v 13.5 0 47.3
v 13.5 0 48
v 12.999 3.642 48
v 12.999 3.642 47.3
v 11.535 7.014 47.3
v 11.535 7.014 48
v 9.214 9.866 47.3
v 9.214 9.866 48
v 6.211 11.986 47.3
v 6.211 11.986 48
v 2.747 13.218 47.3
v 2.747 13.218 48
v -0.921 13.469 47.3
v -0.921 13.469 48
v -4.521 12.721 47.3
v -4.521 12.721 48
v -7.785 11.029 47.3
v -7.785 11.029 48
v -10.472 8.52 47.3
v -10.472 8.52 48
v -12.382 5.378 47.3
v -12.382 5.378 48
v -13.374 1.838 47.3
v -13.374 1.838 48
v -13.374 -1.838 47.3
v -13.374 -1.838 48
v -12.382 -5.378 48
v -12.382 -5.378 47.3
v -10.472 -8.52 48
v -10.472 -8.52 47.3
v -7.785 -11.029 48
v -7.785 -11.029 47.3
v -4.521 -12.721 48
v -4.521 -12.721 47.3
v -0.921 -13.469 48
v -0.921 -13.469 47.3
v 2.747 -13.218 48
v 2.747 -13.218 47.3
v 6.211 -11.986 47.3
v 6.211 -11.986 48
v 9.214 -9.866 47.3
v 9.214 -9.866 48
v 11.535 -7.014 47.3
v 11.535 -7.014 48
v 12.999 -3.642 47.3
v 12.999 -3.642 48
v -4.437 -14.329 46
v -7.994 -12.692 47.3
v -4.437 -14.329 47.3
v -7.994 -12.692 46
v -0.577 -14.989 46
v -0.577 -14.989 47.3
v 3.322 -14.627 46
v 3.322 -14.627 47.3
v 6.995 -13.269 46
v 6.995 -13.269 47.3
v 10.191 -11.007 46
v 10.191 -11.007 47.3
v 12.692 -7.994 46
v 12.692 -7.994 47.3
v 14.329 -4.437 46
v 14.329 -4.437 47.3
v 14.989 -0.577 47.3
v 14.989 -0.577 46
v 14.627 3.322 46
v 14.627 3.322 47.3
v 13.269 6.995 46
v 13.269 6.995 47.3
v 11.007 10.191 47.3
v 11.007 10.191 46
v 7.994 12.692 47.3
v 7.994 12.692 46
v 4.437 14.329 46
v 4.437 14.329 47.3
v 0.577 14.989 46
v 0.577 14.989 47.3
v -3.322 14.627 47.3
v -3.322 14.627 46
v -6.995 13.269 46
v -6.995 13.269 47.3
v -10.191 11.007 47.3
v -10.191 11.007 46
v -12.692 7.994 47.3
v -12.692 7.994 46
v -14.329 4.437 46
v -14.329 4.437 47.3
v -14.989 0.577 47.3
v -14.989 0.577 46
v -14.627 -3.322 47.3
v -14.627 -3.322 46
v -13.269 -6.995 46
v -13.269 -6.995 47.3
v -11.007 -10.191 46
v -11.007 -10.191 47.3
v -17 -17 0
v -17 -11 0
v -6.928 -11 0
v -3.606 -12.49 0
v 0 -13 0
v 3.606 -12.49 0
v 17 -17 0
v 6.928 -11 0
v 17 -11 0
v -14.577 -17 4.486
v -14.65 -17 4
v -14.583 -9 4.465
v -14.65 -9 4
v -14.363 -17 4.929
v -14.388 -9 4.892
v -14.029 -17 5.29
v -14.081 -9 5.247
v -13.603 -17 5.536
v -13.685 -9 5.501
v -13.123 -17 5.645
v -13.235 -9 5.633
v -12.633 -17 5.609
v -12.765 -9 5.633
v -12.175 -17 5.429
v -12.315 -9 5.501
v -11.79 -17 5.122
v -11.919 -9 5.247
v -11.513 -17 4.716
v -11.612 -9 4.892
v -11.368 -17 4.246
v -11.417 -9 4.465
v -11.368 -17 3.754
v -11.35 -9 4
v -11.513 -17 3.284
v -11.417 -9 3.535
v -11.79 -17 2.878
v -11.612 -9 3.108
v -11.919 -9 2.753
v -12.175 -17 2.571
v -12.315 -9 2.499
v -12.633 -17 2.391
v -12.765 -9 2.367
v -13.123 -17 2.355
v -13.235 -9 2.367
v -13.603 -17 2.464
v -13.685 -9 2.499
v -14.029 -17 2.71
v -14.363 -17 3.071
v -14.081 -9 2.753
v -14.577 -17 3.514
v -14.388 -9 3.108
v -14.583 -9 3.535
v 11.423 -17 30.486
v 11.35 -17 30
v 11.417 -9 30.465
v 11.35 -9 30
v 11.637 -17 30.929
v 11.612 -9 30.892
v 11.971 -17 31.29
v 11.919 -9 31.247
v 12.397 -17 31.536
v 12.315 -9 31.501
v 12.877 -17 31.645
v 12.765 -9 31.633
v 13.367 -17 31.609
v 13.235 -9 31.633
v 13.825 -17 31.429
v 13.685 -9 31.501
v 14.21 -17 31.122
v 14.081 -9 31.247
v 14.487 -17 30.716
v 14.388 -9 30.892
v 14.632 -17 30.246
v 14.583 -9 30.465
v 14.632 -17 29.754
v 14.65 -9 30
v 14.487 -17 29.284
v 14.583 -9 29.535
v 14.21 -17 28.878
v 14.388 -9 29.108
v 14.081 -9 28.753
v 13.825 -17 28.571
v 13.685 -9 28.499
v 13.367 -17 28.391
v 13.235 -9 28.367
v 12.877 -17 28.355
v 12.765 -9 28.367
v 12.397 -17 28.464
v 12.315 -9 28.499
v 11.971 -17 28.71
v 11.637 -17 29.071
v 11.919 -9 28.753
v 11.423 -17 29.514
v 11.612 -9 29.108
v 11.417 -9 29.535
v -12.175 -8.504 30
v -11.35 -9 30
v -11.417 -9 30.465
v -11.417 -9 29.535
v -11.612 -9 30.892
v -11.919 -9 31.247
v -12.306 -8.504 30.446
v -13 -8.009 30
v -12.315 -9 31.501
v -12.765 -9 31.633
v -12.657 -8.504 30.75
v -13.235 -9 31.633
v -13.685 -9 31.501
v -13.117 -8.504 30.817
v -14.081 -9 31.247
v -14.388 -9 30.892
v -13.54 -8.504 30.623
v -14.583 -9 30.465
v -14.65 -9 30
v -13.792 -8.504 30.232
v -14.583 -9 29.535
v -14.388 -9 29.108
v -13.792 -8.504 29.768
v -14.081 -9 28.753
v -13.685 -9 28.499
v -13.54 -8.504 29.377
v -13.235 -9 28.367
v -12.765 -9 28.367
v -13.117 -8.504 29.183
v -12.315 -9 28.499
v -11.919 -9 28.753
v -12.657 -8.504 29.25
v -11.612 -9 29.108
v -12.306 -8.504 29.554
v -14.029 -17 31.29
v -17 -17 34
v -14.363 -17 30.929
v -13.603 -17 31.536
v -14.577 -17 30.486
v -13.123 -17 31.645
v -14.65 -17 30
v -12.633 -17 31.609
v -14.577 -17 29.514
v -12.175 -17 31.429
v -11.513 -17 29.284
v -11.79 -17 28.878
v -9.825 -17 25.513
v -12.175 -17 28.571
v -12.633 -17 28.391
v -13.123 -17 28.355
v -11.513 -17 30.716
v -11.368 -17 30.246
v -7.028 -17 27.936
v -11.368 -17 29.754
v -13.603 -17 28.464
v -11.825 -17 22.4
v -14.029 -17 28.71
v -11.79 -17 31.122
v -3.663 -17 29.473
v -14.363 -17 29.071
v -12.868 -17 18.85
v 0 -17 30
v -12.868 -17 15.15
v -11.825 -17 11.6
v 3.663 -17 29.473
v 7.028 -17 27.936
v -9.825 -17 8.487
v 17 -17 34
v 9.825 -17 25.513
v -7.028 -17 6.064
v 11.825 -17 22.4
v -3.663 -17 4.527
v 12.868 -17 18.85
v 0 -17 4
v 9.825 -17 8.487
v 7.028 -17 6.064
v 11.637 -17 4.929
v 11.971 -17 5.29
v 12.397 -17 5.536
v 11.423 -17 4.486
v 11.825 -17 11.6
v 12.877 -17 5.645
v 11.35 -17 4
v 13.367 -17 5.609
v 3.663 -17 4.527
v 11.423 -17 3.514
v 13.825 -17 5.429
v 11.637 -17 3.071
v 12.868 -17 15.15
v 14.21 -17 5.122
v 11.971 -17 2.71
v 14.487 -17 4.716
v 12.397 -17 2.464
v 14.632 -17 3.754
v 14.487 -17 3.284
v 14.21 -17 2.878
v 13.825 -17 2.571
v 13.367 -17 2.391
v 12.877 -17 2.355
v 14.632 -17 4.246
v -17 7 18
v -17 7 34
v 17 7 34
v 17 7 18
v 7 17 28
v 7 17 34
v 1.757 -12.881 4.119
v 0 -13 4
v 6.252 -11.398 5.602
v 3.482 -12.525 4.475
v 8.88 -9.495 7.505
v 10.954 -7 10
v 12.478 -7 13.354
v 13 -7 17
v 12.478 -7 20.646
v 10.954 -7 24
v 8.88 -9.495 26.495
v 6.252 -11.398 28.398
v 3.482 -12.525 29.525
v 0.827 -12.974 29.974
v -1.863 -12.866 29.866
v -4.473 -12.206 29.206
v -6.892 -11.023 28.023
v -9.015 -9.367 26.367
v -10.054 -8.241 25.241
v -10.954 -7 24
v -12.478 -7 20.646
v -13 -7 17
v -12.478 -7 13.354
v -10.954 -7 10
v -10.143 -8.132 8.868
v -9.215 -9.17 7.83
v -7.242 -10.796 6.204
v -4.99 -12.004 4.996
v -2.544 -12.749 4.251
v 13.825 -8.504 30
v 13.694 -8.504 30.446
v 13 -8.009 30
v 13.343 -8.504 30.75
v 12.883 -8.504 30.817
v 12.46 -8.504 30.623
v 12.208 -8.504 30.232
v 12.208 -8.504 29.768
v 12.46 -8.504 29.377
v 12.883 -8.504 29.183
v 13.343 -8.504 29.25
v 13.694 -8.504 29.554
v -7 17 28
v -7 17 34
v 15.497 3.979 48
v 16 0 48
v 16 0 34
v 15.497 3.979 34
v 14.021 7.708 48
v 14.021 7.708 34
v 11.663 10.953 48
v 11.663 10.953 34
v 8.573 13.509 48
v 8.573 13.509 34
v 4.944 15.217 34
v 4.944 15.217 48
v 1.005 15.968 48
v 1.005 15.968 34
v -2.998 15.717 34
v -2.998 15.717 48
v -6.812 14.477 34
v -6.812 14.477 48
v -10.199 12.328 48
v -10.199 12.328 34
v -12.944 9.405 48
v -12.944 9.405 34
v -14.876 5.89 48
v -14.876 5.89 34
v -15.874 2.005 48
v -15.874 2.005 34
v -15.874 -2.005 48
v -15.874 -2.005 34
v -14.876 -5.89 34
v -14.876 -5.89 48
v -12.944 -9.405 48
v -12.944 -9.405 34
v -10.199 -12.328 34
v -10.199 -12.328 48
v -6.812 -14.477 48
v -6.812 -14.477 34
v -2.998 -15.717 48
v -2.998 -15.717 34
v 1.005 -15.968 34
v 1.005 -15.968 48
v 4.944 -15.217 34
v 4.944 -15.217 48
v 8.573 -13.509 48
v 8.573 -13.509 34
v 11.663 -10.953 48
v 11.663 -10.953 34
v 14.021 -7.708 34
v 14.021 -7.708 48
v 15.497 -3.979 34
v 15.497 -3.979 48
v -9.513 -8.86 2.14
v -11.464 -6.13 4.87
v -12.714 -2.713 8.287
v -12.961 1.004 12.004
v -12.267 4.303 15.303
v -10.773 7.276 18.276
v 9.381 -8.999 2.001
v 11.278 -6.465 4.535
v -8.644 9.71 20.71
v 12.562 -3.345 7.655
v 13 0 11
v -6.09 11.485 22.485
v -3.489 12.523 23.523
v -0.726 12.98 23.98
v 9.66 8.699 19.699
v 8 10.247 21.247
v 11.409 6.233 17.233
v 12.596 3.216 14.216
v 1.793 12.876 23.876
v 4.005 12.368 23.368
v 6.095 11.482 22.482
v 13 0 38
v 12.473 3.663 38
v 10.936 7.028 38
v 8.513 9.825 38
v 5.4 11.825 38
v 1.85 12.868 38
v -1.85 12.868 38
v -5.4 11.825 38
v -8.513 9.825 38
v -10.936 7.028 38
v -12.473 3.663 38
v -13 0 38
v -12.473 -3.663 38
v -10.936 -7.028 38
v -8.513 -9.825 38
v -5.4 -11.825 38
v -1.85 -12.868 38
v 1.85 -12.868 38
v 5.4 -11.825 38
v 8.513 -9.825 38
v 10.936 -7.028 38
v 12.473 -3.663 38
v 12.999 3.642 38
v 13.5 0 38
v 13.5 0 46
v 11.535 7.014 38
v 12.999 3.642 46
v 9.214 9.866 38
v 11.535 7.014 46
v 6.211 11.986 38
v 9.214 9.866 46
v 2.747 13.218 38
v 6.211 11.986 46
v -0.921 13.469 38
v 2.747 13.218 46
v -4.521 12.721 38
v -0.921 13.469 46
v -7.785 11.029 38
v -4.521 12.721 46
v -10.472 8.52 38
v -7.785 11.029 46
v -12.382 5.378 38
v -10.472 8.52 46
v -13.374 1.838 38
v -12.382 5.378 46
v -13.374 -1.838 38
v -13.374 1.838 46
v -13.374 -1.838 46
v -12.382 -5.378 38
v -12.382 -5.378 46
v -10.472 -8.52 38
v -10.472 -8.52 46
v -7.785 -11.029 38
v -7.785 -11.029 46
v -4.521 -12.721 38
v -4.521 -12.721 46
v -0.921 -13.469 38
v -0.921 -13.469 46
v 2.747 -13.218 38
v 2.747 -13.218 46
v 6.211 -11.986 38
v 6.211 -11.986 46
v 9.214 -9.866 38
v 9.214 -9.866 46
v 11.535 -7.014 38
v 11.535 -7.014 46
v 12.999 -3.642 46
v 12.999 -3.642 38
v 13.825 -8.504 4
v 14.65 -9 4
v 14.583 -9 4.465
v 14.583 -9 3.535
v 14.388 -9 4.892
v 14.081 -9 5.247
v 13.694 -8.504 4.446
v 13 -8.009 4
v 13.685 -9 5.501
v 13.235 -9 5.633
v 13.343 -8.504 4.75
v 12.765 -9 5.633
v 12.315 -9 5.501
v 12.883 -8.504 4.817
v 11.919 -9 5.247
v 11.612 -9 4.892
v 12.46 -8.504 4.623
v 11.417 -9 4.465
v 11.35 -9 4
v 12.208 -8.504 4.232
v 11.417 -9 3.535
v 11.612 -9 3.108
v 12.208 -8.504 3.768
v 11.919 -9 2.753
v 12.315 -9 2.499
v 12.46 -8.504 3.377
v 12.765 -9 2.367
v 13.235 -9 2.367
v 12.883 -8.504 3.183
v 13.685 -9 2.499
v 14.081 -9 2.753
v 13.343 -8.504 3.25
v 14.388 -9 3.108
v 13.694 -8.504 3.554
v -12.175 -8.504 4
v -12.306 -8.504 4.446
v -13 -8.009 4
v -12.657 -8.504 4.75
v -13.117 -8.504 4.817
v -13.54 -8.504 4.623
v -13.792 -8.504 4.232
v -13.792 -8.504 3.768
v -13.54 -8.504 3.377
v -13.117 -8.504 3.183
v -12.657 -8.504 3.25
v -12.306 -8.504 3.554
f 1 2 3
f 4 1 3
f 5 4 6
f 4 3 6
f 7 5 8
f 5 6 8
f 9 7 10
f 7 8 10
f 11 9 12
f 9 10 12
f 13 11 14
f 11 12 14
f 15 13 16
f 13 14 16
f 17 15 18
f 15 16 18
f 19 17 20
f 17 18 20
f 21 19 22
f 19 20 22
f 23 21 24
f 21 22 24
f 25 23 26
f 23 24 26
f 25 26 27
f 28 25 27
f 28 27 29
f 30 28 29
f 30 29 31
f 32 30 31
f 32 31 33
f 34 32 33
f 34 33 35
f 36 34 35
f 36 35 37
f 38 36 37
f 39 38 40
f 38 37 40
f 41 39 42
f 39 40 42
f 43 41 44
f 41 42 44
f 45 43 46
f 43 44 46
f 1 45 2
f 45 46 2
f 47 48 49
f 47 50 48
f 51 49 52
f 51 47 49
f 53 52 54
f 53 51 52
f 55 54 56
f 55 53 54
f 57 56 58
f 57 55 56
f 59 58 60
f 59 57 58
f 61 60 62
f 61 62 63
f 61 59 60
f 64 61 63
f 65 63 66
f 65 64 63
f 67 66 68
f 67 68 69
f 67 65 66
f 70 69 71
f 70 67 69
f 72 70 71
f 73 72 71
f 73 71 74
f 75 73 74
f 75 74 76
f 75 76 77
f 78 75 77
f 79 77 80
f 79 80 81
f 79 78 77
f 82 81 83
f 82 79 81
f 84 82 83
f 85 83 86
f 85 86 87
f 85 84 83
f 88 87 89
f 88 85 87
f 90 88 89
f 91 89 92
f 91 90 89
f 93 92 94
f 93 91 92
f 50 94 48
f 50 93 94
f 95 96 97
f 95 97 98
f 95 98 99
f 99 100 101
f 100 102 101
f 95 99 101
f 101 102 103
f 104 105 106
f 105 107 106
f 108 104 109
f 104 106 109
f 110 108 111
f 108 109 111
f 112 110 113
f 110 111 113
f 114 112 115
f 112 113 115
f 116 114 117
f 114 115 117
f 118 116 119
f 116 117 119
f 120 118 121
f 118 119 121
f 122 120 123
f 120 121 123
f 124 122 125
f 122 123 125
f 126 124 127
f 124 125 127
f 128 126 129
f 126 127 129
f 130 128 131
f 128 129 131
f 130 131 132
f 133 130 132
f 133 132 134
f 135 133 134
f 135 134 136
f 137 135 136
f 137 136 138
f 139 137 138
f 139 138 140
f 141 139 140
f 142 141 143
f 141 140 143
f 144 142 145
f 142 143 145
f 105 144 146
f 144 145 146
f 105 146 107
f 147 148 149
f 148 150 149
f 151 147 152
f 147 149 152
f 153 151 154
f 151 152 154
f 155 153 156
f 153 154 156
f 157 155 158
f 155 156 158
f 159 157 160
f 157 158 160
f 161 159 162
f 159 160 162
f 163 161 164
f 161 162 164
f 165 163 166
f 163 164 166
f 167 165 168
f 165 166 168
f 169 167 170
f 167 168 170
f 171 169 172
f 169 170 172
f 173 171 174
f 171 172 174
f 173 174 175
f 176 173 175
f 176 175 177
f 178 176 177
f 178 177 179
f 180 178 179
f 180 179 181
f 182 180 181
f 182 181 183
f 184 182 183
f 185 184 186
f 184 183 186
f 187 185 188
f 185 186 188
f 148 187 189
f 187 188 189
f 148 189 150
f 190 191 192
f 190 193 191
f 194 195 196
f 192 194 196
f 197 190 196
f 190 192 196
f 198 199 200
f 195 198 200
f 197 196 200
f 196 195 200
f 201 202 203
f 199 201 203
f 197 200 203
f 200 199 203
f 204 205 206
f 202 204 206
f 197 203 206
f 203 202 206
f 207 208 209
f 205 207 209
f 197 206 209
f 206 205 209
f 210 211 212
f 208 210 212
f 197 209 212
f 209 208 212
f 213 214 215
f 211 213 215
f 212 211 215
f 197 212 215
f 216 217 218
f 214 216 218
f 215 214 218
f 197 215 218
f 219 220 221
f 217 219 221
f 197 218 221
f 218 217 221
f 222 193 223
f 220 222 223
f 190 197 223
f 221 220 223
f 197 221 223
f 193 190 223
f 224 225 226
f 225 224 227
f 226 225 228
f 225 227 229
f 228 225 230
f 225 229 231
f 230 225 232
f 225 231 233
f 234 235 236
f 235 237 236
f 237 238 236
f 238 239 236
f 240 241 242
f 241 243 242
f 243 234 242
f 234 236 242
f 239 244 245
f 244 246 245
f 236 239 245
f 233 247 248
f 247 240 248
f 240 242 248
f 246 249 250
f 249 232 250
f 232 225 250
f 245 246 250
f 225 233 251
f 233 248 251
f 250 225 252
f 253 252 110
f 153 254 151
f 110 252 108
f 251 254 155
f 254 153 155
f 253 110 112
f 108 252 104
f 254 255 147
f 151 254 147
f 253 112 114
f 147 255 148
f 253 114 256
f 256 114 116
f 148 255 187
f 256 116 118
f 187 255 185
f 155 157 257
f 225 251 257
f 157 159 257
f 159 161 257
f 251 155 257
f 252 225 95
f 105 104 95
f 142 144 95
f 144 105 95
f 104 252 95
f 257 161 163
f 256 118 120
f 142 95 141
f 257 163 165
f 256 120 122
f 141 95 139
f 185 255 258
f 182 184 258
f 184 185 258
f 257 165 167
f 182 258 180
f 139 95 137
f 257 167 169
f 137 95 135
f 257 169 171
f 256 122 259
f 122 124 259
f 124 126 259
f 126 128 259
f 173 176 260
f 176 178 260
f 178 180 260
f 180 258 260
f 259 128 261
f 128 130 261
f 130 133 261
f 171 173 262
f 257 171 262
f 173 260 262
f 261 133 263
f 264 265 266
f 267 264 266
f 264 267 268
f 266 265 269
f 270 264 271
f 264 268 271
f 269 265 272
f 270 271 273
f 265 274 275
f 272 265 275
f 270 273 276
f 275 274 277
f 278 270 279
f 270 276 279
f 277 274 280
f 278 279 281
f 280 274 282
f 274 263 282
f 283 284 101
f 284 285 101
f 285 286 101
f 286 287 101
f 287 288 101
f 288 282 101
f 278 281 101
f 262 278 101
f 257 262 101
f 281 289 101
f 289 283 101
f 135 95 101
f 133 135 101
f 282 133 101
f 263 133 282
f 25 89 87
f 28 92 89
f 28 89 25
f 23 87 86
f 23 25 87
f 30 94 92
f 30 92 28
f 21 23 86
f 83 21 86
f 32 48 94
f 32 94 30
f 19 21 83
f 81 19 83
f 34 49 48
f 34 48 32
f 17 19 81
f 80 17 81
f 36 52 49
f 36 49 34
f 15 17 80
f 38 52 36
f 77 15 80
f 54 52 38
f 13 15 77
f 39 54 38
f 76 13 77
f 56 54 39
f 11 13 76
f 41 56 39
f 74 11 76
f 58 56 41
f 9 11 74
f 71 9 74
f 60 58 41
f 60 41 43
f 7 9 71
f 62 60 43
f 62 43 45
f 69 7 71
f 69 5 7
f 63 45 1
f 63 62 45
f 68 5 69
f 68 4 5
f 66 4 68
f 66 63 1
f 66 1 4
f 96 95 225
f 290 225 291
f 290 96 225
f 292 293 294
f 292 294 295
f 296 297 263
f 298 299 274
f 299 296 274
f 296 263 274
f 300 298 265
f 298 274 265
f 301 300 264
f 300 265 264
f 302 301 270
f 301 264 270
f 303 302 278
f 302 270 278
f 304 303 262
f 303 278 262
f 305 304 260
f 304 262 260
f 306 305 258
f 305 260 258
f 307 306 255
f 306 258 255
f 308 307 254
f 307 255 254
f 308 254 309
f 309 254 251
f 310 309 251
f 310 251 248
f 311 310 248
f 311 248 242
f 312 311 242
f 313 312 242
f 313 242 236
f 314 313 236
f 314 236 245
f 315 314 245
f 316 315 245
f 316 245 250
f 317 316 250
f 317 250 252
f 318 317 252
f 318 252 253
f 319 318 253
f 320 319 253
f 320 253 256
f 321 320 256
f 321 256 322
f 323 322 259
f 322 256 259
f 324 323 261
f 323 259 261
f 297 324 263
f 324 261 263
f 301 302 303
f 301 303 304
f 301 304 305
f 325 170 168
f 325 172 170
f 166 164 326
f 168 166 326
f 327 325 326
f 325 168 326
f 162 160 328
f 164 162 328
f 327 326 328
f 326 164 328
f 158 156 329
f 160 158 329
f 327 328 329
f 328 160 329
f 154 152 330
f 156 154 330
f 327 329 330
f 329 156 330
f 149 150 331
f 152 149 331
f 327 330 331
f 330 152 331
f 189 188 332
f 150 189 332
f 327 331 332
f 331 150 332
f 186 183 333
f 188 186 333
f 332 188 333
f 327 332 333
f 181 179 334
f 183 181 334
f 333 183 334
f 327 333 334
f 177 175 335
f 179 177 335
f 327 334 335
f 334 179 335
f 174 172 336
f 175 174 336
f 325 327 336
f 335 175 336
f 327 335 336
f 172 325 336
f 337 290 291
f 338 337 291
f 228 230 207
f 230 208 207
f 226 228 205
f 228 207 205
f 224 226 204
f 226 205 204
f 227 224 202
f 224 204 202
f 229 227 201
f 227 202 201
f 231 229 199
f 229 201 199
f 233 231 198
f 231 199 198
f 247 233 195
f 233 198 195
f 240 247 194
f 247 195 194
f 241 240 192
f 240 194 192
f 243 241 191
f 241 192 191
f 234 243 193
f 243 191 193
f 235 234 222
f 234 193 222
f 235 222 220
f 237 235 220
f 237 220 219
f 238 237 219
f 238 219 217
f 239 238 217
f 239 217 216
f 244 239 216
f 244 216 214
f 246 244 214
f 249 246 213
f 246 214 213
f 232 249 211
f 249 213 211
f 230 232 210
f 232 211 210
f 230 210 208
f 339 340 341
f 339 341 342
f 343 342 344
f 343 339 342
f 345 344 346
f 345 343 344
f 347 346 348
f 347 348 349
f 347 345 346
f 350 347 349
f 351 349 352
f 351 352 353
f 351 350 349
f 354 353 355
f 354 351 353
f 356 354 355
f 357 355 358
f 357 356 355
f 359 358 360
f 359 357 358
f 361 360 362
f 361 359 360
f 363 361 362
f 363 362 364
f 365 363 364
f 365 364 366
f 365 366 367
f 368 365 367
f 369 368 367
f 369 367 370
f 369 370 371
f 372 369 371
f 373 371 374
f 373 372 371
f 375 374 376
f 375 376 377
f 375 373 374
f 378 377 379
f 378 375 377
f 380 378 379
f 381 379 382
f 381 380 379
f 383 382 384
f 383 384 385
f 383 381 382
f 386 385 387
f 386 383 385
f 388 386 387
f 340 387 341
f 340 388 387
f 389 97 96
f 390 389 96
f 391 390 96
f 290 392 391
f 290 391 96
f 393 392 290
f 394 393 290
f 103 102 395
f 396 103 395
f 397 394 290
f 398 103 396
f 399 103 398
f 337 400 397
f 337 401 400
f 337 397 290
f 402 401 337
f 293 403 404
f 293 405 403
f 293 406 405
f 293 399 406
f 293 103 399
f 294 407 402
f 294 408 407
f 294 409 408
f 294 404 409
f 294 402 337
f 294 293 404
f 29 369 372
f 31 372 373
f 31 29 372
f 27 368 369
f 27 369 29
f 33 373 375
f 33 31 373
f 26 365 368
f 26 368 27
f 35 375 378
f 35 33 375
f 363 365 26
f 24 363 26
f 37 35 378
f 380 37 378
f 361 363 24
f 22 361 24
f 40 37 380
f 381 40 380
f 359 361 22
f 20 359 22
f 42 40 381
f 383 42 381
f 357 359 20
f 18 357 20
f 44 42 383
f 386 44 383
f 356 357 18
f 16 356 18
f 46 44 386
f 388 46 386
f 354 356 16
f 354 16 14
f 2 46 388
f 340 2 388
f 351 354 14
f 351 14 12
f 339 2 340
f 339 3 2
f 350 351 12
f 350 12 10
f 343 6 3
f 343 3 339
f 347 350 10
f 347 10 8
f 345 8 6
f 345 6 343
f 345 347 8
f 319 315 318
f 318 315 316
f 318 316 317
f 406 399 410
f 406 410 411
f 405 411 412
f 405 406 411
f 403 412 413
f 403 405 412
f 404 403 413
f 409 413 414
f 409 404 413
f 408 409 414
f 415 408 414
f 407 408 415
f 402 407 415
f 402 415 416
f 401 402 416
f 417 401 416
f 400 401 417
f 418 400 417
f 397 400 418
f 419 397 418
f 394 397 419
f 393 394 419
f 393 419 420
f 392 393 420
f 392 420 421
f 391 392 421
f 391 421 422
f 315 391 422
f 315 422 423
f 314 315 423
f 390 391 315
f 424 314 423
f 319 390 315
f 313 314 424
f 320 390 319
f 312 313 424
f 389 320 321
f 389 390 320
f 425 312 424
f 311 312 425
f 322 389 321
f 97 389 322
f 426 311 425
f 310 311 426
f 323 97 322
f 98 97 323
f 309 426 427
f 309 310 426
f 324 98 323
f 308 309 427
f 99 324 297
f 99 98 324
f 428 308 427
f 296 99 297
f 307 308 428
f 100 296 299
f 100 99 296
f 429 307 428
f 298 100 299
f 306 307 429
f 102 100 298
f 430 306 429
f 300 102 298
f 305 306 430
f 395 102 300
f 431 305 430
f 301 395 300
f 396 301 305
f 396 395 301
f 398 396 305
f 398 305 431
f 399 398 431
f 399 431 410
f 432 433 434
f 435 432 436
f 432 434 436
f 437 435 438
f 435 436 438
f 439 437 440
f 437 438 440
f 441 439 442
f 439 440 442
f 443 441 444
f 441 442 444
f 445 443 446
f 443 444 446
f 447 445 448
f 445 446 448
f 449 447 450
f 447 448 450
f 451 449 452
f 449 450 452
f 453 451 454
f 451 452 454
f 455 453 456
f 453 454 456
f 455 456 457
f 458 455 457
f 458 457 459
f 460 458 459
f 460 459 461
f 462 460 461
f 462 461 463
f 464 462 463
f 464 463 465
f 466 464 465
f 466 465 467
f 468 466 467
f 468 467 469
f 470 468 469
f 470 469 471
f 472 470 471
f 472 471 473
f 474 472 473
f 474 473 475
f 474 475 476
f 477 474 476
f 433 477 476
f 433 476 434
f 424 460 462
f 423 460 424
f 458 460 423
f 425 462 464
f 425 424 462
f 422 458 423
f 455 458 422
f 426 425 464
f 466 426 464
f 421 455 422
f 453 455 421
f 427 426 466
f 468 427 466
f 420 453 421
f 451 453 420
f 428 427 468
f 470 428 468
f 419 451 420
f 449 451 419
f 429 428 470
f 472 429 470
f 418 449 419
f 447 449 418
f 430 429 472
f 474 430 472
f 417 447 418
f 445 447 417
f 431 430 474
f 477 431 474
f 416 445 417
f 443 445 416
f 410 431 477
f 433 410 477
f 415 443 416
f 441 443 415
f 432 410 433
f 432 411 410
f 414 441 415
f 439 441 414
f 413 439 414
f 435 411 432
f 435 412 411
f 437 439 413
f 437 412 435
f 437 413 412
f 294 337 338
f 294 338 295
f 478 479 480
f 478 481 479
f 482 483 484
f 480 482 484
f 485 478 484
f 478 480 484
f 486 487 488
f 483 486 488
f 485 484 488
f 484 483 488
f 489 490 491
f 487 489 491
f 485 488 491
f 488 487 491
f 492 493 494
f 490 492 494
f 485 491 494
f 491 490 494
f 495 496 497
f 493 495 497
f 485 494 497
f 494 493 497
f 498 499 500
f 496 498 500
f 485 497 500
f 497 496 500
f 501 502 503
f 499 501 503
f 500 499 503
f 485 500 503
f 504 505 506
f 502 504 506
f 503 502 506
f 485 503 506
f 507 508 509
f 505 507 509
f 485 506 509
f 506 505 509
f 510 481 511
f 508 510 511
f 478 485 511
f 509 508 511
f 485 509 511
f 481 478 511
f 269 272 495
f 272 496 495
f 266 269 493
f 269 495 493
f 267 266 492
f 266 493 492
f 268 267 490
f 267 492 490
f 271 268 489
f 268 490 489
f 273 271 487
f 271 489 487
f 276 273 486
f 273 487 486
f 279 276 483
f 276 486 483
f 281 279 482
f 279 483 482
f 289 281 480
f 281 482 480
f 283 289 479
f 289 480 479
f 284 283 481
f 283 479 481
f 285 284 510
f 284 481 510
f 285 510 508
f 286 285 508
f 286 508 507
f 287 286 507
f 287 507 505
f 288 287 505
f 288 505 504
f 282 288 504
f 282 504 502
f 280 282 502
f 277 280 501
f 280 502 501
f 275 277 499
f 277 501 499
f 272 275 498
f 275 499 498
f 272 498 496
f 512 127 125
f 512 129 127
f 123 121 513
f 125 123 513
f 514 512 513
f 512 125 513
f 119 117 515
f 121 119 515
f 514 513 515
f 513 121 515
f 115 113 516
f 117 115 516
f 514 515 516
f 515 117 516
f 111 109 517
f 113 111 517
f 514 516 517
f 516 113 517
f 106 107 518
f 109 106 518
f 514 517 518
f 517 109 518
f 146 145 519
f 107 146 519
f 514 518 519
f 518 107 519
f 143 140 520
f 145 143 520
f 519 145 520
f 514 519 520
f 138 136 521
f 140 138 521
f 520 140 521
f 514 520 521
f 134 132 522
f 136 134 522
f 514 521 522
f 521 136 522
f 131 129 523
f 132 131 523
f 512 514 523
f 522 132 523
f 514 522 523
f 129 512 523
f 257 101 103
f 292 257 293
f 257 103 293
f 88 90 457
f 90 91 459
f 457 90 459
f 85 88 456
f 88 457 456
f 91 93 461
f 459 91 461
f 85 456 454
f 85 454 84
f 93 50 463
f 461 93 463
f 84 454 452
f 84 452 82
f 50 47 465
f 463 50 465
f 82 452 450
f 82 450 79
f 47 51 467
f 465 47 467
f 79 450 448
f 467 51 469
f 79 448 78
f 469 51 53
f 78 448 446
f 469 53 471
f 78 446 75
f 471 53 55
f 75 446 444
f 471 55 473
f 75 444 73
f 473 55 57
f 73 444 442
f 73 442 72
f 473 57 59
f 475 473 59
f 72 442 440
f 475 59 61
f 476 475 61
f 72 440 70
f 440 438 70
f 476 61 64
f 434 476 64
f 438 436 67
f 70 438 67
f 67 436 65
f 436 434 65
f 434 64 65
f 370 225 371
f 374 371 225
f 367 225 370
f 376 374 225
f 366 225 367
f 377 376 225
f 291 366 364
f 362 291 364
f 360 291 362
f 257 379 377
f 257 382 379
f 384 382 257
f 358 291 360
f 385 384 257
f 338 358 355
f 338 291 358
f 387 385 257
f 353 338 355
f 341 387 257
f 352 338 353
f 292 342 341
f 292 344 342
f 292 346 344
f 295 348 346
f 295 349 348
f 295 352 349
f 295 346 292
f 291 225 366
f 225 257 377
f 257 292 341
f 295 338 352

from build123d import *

# Parameters (mm, degrees)
SKETCH_1_W             = 34
SKETCH_1_H             = 34
SKETCH_1_R             = 13
EXTRUDE_1_DEPTH        = 48
SKETCH_2_R             = 13.5
CUT_EXTRUDE_1_DEPTH    = 10
SKETCH_3_R             = 13
CUT_EXTRUDE_2_DEPTH    = 10
CHAMFER_1_SIZE         = 10
CHAMFER_2_SIZE         = 28
SKETCH_5_R             = 16
CUT_EXTRUDE_4_DEPTH    = 14
HOLE_WIZARD_M4_1_D     = 3.3
HOLE_WIZARD_M4_1_DEPTH = 8
HOLE_WIZARD_M4_1_TIP   = 0.991420021
SKETCH_8_W             = 1.3
SKETCH_8_H             = 1.5


with BuildPart() as part:
    # 草图1 → 凸台-拉伸1 (new body)
    with BuildSketch(Plane.XY):
        Rectangle(SKETCH_1_W, SKETCH_1_H)
        Circle(SKETCH_1_R, mode=Mode.SUBTRACT)
    extrude(amount=EXTRUDE_1_DEPTH)

    # 草图2 → 切除-拉伸1 (cut)
    with BuildSketch(Plane.XY.offset(48)):
        Circle(SKETCH_2_R)
    extrude(amount=-CUT_EXTRUDE_1_DEPTH, mode=Mode.SUBTRACT)

    # 草图3 → 切除-拉伸2 (cut)
    with BuildSketch(Plane.XZ.offset(17)):
        with Locations(Location((0, 17, 0), (0, 0, 270))):
            Circle(SKETCH_3_R)
    extrude(amount=-CUT_EXTRUDE_2_DEPTH, mode=Mode.SUBTRACT)

    # 倒角1
    chamfer_1_edges = [part.edges().sort_by_distance(p)[0] for p in [
        (-17, 17, 24),
        (17, 17, 24),
    ]]
    chamfer(chamfer_1_edges, length=CHAMFER_1_SIZE)

    # 倒角2
    # the kernel refuses this chamfer: 28 mm, written as the material it takes off along each edge
    with BuildSketch(Plane(origin=(79.007123663, 17, 0), x_dir=(0, -0.9996219169112968, -0.027495876610586376), z_dir=(-1, 0, 0))) as chamfer_2_piece_1:
        Polygon((CHAMFER_2_SIZE * 0.999621916911, CHAMFER_2_SIZE * 0.0274958766106), (-CHAMFER_2_SIZE * 0.0274958766106, CHAMFER_2_SIZE * 0.999621916911), (0, 0), align=None)
    extrude(amount=158.014247326, mode=Mode.SUBTRACT)

    # 草图5 → 切除-拉伸4 (cut)
    with BuildSketch(Plane.XY.offset(48)):
        Polygon((-7, 17), (-17, 7), (-17, -17), (17, -17), (17, 7), (7, 17), align=None)
        Circle(SKETCH_5_R, mode=Mode.SUBTRACT)
    extrude(amount=-CUT_EXTRUDE_4_DEPTH, mode=Mode.SUBTRACT)

    # M4 螺纹孔1
    with Locations(Plane.XZ.offset(17)):
        with Locations((13, 30), (13, 4), (-13, 4), (-13, 30)):
            Hole(HOLE_WIZARD_M4_1_D / 2, depth=HOLE_WIZARD_M4_1_DEPTH)
            with Locations((0, 0, -(HOLE_WIZARD_M4_1_DEPTH + HOLE_WIZARD_M4_1_TIP / 2))):  # 118° drill point
                Cone(0, HOLE_WIZARD_M4_1_D / 2, HOLE_WIZARD_M4_1_TIP, mode=Mode.SUBTRACT)

    # 草图8 → 切除-旋转1 (revolve, cut)
    with BuildSketch(Plane(origin=(0, 0, 0), x_dir=(0, 0, -1), z_dir=(1, 0, 0)), mode=Mode.PRIVATE) as cut_revolve_1_sk:
        with Locations((-46.65, 14.25)):
            Rectangle(SKETCH_8_W, SKETCH_8_H)
    revolve(cut_revolve_1_sk.sketch.rotate(Axis((0, 0, 0), (0, 0, 1)), 147.795772496), axis=Axis((0, 0, 0), (0, 0, 1)), mode=Mode.SUBTRACT)


solid = part.part
